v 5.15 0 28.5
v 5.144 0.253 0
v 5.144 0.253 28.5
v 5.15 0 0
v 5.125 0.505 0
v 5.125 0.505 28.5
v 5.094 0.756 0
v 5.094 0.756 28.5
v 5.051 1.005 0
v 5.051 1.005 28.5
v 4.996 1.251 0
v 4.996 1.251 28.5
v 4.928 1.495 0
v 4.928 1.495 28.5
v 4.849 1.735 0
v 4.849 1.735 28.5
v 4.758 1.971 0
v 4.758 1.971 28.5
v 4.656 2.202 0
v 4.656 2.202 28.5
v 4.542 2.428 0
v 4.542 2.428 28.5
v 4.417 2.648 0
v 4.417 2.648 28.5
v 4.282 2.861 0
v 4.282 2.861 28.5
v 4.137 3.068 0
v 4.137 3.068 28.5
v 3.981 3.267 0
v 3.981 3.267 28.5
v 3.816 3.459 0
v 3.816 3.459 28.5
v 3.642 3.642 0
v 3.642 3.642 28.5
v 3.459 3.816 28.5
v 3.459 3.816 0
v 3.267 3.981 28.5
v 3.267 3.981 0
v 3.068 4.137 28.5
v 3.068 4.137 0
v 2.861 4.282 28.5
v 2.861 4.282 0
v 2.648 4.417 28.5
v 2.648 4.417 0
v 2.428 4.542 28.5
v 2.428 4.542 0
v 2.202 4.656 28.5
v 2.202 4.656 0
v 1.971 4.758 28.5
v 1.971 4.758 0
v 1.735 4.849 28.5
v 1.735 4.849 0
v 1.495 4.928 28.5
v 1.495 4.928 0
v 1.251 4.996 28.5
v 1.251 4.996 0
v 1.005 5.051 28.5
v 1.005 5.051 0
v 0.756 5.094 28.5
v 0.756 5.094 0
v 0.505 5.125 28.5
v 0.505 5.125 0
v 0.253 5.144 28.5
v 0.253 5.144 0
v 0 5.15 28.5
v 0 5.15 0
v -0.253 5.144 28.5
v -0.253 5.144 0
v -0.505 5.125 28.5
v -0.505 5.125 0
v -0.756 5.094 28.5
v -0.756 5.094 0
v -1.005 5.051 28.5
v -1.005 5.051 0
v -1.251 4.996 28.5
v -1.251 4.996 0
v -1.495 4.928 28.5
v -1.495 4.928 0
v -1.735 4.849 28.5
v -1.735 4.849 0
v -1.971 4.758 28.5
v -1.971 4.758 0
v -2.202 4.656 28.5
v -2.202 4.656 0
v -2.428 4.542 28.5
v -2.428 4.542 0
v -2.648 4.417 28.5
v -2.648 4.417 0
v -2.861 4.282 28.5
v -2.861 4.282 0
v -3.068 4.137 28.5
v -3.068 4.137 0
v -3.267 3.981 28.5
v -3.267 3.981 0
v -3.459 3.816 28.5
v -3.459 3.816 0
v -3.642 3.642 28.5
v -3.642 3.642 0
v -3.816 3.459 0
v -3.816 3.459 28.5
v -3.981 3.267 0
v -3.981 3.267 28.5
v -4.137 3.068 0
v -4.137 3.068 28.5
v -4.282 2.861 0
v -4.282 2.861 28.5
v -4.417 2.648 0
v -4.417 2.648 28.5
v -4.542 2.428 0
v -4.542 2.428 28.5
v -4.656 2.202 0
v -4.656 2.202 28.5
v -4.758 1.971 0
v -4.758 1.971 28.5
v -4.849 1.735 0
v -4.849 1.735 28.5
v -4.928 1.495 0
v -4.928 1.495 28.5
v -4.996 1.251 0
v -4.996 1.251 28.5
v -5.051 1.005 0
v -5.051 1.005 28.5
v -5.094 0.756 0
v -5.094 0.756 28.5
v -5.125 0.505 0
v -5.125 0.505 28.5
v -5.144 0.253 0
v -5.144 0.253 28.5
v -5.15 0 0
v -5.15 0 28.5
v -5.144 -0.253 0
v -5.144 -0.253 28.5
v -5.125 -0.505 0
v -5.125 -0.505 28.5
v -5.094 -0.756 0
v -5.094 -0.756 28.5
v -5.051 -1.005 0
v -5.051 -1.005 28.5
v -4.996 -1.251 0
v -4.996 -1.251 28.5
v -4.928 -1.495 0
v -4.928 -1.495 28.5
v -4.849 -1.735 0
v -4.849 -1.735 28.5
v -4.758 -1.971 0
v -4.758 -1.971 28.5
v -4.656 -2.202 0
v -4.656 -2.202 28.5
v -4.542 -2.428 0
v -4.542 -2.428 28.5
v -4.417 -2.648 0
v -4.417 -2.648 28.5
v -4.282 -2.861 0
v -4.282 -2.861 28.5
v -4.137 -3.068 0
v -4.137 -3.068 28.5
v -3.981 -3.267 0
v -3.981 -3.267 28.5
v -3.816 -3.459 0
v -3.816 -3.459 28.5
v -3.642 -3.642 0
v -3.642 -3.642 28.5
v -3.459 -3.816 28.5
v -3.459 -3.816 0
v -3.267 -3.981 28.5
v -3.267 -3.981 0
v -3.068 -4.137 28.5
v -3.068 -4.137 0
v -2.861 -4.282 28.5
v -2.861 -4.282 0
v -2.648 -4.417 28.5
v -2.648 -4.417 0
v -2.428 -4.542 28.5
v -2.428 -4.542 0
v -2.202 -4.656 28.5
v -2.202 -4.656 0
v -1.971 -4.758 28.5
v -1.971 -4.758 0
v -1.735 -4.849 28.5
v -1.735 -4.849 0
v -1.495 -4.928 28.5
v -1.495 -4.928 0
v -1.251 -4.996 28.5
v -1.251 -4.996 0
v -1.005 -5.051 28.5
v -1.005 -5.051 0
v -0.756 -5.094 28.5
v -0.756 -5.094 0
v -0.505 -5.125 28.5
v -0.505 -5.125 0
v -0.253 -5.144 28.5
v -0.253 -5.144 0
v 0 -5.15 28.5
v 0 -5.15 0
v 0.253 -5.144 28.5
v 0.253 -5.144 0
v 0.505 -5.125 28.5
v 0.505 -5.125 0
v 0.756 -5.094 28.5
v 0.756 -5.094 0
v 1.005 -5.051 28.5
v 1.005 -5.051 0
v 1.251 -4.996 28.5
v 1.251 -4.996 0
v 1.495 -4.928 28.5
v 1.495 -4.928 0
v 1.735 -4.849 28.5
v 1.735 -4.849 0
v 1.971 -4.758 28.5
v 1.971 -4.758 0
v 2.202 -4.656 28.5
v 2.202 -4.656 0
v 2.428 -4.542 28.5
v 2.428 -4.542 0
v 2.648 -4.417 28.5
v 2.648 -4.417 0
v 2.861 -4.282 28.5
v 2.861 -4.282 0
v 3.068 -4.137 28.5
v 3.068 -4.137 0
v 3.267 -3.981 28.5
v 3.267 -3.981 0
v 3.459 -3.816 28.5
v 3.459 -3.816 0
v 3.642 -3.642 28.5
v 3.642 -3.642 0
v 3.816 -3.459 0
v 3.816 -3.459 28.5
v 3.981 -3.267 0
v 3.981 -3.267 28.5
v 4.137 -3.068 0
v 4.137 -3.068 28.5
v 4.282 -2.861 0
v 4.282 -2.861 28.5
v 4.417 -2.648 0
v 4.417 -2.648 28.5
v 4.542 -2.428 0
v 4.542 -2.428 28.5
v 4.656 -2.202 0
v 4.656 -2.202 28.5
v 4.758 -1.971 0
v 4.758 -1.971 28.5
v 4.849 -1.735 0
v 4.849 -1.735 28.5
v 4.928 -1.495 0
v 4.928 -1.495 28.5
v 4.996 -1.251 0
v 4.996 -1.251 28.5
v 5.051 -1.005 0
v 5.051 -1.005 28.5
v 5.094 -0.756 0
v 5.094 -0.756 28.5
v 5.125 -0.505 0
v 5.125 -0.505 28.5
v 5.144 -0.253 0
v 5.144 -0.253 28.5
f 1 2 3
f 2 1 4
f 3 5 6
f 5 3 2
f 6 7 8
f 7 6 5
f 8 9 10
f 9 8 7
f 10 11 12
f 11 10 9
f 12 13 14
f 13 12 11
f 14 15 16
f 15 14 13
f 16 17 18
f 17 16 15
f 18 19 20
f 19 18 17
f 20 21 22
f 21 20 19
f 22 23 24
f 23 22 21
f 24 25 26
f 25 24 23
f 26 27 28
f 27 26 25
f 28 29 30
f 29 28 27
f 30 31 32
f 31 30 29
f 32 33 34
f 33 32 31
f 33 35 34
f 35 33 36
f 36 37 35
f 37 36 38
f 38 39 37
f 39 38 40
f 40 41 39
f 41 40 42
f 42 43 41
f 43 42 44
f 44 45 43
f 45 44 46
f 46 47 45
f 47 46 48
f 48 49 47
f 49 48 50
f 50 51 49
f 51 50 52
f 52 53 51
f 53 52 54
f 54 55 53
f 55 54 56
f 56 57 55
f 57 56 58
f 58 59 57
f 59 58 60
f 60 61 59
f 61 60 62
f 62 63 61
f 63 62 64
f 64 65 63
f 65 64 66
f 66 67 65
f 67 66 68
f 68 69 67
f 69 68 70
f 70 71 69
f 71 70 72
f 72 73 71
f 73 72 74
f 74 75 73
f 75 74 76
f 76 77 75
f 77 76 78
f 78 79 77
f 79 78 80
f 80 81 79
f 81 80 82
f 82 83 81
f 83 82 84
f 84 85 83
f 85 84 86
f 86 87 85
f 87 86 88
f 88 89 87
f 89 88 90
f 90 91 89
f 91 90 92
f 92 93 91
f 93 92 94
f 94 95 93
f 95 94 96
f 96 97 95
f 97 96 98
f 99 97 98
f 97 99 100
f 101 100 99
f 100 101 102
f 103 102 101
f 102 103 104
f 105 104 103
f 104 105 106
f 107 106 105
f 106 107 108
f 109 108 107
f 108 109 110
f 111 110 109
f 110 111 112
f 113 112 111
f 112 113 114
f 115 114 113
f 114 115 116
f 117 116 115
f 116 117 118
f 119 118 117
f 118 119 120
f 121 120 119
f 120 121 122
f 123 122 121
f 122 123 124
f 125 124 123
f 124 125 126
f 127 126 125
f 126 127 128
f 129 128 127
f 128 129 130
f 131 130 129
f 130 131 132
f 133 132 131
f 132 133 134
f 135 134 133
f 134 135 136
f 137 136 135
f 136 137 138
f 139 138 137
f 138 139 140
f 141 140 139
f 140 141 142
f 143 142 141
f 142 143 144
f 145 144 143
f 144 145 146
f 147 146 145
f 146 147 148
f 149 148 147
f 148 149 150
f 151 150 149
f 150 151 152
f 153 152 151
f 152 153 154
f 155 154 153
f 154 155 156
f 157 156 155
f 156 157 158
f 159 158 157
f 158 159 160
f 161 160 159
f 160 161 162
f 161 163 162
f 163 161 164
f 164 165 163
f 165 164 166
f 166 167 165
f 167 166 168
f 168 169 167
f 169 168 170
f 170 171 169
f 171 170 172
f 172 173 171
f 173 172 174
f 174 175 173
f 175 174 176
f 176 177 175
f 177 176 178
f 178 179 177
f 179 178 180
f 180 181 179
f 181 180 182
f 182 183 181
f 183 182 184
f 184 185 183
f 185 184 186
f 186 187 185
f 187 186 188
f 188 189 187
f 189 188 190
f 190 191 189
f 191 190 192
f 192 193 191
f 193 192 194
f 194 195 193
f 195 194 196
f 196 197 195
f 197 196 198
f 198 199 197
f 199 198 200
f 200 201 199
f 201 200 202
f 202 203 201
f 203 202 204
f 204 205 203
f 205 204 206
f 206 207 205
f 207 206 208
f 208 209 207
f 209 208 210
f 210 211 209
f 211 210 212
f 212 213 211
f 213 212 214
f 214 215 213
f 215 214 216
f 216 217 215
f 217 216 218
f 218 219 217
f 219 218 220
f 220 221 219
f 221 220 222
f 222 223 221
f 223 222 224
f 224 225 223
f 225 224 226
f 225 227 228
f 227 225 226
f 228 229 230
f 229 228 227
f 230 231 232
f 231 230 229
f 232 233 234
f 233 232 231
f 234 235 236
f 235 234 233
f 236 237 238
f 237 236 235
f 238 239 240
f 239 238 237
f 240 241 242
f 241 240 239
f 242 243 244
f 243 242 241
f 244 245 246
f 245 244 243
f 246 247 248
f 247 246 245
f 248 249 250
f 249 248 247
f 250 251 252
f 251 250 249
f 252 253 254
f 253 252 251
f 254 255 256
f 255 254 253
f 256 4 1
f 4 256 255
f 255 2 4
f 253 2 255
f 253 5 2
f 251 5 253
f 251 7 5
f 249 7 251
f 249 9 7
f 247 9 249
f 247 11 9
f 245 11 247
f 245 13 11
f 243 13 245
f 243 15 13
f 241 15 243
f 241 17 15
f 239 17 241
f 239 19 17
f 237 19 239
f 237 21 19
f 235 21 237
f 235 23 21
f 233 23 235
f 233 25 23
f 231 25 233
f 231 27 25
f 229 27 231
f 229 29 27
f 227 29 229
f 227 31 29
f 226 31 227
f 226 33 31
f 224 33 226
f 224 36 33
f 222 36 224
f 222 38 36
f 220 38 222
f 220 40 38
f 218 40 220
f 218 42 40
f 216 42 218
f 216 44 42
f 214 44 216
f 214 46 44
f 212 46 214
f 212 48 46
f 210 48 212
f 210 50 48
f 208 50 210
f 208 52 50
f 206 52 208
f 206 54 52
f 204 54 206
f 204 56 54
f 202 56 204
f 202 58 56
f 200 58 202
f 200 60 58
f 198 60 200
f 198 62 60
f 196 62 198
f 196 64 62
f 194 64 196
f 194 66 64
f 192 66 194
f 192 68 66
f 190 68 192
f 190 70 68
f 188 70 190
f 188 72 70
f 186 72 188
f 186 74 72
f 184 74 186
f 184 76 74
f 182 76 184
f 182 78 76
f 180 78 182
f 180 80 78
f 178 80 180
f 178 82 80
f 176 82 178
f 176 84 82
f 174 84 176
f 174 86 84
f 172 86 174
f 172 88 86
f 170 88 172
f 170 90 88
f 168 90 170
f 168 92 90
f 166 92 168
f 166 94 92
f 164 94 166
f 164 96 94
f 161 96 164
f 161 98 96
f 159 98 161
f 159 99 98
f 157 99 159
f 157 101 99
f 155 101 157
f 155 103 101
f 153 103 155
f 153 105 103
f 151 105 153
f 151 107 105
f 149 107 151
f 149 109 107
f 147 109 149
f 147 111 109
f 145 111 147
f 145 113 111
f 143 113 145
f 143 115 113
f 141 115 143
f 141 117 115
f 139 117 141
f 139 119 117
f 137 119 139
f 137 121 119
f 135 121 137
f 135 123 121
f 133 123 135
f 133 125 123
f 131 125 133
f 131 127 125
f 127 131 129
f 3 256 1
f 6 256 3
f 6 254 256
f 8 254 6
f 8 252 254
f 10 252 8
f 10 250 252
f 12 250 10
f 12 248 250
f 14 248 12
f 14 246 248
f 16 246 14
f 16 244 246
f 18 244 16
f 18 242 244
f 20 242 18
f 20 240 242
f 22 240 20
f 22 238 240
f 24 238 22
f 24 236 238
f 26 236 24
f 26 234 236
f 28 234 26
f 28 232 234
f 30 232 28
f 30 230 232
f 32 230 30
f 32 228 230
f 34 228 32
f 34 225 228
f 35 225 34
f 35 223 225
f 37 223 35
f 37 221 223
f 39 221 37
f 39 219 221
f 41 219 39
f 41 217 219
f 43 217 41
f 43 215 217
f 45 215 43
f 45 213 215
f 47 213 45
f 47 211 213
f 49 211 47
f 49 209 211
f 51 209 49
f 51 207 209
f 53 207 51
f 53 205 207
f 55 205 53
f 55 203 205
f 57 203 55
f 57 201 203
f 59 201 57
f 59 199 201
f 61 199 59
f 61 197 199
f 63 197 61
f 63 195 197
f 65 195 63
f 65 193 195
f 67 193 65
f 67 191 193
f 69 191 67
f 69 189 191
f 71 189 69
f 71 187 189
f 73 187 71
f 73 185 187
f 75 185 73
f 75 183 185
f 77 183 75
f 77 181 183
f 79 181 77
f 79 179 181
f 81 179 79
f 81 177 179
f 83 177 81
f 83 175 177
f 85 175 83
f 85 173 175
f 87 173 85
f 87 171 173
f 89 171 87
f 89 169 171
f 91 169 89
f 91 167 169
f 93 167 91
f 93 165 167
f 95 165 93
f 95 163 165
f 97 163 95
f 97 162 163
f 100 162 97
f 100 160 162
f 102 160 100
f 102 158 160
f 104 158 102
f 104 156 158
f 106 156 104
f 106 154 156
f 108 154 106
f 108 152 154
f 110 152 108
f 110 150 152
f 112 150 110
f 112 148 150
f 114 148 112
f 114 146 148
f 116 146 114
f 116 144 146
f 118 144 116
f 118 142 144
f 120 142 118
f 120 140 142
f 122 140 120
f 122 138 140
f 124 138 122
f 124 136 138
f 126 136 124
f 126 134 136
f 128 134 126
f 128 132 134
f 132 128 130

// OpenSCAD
$fn=128;

height = 28.5;      // mm
diameter = 10.3;    // mm

cylinder(h=height, d=diameter);
